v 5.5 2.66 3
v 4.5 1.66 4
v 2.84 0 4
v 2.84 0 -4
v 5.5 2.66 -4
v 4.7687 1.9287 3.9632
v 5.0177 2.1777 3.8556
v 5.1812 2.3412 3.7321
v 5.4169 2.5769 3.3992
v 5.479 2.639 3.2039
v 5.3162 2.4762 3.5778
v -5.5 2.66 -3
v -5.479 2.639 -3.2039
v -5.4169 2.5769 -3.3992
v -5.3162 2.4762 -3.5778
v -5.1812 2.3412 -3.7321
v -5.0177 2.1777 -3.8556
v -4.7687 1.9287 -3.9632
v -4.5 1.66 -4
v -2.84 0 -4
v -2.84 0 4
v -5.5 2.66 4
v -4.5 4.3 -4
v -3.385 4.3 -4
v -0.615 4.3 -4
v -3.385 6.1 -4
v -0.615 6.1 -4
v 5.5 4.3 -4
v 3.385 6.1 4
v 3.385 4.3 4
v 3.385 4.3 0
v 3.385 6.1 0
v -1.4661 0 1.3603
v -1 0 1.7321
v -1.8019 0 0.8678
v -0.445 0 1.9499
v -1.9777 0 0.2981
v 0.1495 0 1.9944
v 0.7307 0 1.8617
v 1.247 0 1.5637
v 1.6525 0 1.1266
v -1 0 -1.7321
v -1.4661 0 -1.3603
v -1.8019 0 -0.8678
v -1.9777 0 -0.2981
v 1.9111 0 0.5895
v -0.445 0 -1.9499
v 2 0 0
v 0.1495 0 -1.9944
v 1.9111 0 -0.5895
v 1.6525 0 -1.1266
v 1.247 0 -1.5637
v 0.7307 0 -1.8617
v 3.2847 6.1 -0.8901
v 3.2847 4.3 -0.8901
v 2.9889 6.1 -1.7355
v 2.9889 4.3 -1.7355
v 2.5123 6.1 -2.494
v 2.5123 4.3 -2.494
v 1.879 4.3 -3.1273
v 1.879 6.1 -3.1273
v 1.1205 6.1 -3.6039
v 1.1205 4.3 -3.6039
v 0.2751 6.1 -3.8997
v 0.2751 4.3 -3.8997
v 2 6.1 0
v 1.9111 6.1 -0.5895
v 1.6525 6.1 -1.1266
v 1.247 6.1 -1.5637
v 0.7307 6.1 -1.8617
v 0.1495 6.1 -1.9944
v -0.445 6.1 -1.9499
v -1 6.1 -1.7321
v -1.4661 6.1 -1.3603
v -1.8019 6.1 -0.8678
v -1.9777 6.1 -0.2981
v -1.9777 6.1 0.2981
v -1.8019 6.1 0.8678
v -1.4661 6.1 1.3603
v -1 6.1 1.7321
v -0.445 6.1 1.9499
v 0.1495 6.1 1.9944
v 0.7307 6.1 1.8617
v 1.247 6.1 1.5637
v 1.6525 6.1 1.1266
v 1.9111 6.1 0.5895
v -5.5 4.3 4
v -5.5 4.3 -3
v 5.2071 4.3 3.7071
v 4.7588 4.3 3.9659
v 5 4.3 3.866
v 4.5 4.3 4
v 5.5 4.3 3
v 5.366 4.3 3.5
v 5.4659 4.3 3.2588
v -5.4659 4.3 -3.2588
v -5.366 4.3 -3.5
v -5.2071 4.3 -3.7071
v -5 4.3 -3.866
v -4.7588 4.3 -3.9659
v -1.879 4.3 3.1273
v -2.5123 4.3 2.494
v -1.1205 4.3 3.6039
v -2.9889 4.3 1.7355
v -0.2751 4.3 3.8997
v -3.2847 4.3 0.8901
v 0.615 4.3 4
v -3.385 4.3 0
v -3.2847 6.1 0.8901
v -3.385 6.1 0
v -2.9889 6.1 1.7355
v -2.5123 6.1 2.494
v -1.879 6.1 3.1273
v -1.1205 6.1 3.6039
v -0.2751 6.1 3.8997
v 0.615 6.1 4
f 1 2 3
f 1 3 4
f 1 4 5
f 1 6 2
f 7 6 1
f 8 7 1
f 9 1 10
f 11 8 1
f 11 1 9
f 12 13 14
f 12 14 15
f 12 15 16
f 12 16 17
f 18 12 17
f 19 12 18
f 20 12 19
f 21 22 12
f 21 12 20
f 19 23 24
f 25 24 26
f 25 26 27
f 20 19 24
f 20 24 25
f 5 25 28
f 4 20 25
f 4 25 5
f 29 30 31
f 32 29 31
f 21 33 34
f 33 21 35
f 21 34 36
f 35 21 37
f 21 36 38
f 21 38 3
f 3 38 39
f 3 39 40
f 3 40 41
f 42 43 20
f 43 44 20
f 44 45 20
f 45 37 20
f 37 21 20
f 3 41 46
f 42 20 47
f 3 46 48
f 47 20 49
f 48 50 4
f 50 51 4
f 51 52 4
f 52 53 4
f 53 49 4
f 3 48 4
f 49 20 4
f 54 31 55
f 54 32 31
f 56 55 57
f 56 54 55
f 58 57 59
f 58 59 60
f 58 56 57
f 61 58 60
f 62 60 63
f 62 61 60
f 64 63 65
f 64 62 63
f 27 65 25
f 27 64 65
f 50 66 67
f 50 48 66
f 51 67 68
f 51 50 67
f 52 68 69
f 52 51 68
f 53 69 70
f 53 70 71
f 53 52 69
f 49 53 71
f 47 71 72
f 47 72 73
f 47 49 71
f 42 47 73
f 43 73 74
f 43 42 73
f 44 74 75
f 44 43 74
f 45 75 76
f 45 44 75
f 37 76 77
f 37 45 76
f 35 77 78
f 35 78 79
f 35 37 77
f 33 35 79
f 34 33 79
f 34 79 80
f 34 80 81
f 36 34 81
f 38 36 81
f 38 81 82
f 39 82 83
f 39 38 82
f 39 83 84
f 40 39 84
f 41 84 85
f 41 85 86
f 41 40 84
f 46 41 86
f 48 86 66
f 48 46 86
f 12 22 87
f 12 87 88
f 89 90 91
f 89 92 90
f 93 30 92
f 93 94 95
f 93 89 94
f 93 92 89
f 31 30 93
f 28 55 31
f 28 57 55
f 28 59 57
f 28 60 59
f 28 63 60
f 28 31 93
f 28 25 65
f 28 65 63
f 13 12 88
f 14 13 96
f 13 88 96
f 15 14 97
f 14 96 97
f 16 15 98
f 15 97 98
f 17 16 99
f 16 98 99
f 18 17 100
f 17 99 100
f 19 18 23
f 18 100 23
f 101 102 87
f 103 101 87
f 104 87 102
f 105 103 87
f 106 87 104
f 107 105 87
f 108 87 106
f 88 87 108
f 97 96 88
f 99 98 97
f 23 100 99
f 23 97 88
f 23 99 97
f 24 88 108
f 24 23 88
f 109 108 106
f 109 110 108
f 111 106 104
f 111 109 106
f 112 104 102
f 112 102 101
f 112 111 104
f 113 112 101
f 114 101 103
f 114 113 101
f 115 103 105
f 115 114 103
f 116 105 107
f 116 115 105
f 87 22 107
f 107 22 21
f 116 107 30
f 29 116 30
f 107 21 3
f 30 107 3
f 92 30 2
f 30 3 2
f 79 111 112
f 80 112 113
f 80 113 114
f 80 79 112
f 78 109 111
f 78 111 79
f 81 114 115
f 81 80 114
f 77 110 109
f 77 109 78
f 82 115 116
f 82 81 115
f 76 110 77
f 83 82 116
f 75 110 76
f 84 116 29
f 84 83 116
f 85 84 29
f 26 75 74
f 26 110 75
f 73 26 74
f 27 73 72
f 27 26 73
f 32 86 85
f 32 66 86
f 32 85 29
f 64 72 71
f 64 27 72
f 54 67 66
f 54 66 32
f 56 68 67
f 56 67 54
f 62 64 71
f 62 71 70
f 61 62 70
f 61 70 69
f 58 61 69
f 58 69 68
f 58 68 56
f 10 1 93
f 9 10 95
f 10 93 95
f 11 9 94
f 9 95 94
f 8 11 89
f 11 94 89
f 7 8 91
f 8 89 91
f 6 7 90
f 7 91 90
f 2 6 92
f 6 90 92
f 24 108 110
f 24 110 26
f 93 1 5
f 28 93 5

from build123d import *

# Parameters (mm, degrees)
SKETCH1_W           = 11
SKETCH1_H           = 8
SKETCH1_R           = 2
BOSS_EXTRUDE1_DEPTH = 4.3
CUT_EXTRUDE1_DEPTH  = 9
SKETCH3_W           = 6.77
SKETCH3_H           = 8
SKETCH3_R           = 2
BOSS_EXTRUDE2_DEPTH = 1.8
FILLET1_R           = 4
FILLET2_R           = 1


with BuildPart() as part:
    # Sketch1 → Boss-Extrude1 (new body)
    with BuildSketch(Plane(origin=(0, 0, 0), x_dir=(1, 0, 0), z_dir=(0, 1, 0))):
        Rectangle(SKETCH1_W, SKETCH1_H)
        Circle(SKETCH1_R, mode=Mode.SUBTRACT)
    extrude(amount=BOSS_EXTRUDE1_DEPTH)

    # Sketch2 → Cut-Extrude1 (cut, through all)
    with BuildSketch(Plane.XY.offset(4)):
        Polygon((-5.5, 2.66), (-2.84, 0), (-5.5, 0), align=None)
        Polygon((5.5, 2.66), (5.5, 0), (2.84, 0), align=None)
    extrude(amount=-CUT_EXTRUDE1_DEPTH, mode=Mode.SUBTRACT)

    # Sketch3 → Boss-Extrude2 (add)
    with BuildSketch(Plane(origin=(0, 4.3, 0), x_dir=(1, 0, 0), z_dir=(0, 1, 0))):
        Rectangle(SKETCH3_W, SKETCH3_H)
        Circle(SKETCH3_R, mode=Mode.SUBTRACT)
    extrude(amount=BOSS_EXTRUDE2_DEPTH)

    # Fillet1
    fillet1_edges = [part.edges().sort_by_distance(p)[0] for p in [
        (3.385, 5.2, -4),
        (-3.385, 5.2, 4),
    ]]
    fillet(fillet1_edges, radius=FILLET1_R)

    # Fillet2
    fillet2_edges = [part.edges().sort_by_distance(p)[0] for p in [
        (5.5, 3.48, 4),
        (-5.5, 3.48, -4),
    ]]
    fillet(fillet2_edges, radius=FILLET2_R)


solid = part.part
